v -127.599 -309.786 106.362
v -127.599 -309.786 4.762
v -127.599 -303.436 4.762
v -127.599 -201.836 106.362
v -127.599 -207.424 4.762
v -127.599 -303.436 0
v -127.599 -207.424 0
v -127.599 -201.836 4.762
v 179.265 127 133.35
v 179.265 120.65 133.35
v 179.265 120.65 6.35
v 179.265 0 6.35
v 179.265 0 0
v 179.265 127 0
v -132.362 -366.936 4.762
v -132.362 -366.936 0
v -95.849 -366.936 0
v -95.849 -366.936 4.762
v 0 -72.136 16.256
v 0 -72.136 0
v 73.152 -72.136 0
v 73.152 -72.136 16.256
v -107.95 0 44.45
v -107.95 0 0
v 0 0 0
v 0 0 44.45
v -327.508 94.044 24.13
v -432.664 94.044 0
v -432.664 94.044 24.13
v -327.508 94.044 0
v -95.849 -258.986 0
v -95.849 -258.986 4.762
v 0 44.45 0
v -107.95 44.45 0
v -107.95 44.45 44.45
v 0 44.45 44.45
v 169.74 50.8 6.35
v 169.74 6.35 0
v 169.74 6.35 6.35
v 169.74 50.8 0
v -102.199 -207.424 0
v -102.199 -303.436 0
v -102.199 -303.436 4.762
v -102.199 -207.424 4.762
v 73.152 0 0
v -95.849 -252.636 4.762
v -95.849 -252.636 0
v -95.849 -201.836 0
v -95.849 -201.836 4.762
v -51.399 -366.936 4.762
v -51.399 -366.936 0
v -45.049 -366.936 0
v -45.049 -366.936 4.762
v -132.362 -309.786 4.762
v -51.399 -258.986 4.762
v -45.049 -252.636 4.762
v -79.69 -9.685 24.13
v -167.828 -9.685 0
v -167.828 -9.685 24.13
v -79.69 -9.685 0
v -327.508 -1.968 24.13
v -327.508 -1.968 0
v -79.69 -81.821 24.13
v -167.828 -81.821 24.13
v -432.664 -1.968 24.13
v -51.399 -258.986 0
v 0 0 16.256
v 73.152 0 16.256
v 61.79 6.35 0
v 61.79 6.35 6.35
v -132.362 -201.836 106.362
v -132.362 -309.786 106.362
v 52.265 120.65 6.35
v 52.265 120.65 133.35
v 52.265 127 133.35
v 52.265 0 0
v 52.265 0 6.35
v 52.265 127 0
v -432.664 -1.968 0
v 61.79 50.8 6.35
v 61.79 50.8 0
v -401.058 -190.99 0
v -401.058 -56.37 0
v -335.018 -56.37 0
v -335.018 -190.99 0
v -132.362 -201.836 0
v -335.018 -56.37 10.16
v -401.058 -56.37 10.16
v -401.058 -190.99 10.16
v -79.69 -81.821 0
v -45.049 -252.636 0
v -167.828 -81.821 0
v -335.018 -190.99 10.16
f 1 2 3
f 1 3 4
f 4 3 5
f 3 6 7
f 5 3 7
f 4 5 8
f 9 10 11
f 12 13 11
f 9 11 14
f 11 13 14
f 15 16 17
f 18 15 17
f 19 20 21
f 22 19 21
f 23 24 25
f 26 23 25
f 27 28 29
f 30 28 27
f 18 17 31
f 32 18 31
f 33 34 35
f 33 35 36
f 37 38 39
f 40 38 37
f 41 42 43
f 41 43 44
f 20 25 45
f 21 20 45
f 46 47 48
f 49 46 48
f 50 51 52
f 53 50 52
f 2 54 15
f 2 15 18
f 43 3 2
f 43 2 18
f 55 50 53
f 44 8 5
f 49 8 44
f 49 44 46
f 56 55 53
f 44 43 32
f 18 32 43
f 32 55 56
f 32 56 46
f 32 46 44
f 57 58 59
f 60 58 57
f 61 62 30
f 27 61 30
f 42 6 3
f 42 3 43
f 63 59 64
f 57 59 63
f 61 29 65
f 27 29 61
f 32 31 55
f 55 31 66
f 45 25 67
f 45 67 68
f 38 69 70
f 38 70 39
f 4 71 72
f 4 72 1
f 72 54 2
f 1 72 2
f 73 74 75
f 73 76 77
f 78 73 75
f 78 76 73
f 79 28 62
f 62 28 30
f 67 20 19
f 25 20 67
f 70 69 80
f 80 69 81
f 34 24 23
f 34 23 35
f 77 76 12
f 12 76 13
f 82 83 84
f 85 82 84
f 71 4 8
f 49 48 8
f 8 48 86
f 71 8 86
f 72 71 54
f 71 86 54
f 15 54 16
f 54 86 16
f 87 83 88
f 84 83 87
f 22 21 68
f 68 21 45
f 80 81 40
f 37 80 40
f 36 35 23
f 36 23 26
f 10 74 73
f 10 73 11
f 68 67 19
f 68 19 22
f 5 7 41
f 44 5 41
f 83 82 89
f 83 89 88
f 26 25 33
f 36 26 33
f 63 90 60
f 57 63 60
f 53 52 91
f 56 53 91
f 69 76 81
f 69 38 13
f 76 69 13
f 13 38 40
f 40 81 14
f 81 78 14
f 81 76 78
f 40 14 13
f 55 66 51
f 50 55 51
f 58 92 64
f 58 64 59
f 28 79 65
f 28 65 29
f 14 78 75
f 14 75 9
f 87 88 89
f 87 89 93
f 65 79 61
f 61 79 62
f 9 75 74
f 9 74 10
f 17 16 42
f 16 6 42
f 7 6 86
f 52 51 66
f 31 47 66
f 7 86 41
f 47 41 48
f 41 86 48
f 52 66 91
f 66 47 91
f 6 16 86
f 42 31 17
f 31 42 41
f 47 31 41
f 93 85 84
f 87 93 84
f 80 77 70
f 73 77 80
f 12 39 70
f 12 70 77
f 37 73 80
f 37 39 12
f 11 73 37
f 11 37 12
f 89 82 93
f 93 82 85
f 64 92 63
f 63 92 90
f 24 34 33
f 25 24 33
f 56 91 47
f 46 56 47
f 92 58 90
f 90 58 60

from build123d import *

# Parameters (mm, degrees)
F0_W      = 107.95
F0_H      = 44.45
F1_DEPTH  = 44.45
F2_W      = 73.152
F2_H      = 72.136
F3_DEPTH  = 16.256
F4_W      = 88.138
F4_H      = 72.136
F5_DEPTH  = 24.13
F6_W      = 105.156
F6_H      = 96.012
F7_DEPTH  = 24.13
F8_W      = 66.04
F8_H      = 134.62
F9_DEPTH  = 10.16
F10_W     = 127
F10_H     = 127
F10_W_2   = 107.95
F10_H_2   = 44.45
F11_DEPTH = 6.35
F12_W     = 127
F12_H     = 6.35
F13_DEPTH = 127
F14_W     = 25.4
F14_H     = 96.012
F15_DEPTH = 4.7625
F17_DEPTH = 101.6


with BuildPart() as f1:
    # F0 (on Top) → F1 (new body)
    with BuildSketch(Plane.XY):
        with Locations((-53.975, 22.225)):
            Rectangle(F0_W, F0_H)
    extrude(amount=F1_DEPTH)


with BuildPart() as f3:
    # F2 (on Top) → F3 (new body)
    with BuildSketch(Plane.XY):
        with Locations((36.576, -36.068)):
            Rectangle(F2_W, F2_H)
    extrude(amount=F3_DEPTH)


with BuildPart() as f5:
    # F4 (on Top) → F5 (new body)
    with BuildSketch(Plane.XY):
        with Locations((-123.758520931, -45.7528464716)):
            Rectangle(F4_W, F4_H)
    extrude(amount=F5_DEPTH)


with BuildPart() as f7:
    # F6 (on Top) → F7 (new body)
    with BuildSketch(Plane.XY):
        with Locations((-380.0858573324, 46.0376664996)):
            Rectangle(F6_W, F6_H)
    extrude(amount=F7_DEPTH)


with BuildPart() as f9:
    # F8 (on Top) → F9 (new body)
    with BuildSketch(Plane.XY):
        with Locations((-368.0375140121, -123.6801221967)):
            Rectangle(F8_W, F8_H)
    extrude(amount=F9_DEPTH)


with BuildPart() as f11:
    # F10 (on Top) → F11 (new body)
    with BuildSketch(Plane.XY):
        with Locations((115.7654884709, 63.5)):
            Rectangle(F10_W, F10_H)
        with Locations((115.7654884709, 28.575)):
            Rectangle(F10_W_2, F10_H_2, mode=Mode.SUBTRACT)
    extrude(amount=F11_DEPTH)

    # F12 (on face) → F13 (join)
    with BuildSketch(Plane.XY.offset(6.35)):
        with Locations((115.7654884709, 123.825)):
            Rectangle(F12_W, F12_H)
    extrude(amount=F13_DEPTH)


with BuildPart() as f15:
    # F14 (on Top) → F15 (new body)
    with BuildSketch(Plane.XY):
        Polygon((-95.8492443254, -201.8363135548), (-132.3617443254, -201.8363135548), (-132.3617443254, -366.9363135548), (-95.8492443254, -366.9363135548), (-95.8492443254, -258.9863135548), (-51.3992443254, -258.9863135548), (-51.3992443254, -366.9363135548), (-45.0492443254, -366.9363135548), (-45.0492443254, -252.6363135548), (-95.8492443254, -252.6363135548), align=None)
        with Locations((-114.8992443254, -255.4303135548)):
            Rectangle(F14_W, F14_H, mode=Mode.SUBTRACT)
    extrude(amount=F15_DEPTH)

    # F16 (on face) → F17 (join)
    with BuildSketch(Plane.XY.offset(4.7625)):
        Polygon((-127.5992443254, -201.8363135548), (-132.3617443254, -201.8363135548), (-132.3617443254, -309.7863135548), (-127.5992443254, -309.7863135548), (-127.5992443254, -303.4363135548), (-127.5992443254, -207.4243135548), align=None)
    extrude(amount=F17_DEPTH)


solid = Compound([f1.part, f3.part, f5.part, f7.part, f9.part, f11.part, f15.part])
